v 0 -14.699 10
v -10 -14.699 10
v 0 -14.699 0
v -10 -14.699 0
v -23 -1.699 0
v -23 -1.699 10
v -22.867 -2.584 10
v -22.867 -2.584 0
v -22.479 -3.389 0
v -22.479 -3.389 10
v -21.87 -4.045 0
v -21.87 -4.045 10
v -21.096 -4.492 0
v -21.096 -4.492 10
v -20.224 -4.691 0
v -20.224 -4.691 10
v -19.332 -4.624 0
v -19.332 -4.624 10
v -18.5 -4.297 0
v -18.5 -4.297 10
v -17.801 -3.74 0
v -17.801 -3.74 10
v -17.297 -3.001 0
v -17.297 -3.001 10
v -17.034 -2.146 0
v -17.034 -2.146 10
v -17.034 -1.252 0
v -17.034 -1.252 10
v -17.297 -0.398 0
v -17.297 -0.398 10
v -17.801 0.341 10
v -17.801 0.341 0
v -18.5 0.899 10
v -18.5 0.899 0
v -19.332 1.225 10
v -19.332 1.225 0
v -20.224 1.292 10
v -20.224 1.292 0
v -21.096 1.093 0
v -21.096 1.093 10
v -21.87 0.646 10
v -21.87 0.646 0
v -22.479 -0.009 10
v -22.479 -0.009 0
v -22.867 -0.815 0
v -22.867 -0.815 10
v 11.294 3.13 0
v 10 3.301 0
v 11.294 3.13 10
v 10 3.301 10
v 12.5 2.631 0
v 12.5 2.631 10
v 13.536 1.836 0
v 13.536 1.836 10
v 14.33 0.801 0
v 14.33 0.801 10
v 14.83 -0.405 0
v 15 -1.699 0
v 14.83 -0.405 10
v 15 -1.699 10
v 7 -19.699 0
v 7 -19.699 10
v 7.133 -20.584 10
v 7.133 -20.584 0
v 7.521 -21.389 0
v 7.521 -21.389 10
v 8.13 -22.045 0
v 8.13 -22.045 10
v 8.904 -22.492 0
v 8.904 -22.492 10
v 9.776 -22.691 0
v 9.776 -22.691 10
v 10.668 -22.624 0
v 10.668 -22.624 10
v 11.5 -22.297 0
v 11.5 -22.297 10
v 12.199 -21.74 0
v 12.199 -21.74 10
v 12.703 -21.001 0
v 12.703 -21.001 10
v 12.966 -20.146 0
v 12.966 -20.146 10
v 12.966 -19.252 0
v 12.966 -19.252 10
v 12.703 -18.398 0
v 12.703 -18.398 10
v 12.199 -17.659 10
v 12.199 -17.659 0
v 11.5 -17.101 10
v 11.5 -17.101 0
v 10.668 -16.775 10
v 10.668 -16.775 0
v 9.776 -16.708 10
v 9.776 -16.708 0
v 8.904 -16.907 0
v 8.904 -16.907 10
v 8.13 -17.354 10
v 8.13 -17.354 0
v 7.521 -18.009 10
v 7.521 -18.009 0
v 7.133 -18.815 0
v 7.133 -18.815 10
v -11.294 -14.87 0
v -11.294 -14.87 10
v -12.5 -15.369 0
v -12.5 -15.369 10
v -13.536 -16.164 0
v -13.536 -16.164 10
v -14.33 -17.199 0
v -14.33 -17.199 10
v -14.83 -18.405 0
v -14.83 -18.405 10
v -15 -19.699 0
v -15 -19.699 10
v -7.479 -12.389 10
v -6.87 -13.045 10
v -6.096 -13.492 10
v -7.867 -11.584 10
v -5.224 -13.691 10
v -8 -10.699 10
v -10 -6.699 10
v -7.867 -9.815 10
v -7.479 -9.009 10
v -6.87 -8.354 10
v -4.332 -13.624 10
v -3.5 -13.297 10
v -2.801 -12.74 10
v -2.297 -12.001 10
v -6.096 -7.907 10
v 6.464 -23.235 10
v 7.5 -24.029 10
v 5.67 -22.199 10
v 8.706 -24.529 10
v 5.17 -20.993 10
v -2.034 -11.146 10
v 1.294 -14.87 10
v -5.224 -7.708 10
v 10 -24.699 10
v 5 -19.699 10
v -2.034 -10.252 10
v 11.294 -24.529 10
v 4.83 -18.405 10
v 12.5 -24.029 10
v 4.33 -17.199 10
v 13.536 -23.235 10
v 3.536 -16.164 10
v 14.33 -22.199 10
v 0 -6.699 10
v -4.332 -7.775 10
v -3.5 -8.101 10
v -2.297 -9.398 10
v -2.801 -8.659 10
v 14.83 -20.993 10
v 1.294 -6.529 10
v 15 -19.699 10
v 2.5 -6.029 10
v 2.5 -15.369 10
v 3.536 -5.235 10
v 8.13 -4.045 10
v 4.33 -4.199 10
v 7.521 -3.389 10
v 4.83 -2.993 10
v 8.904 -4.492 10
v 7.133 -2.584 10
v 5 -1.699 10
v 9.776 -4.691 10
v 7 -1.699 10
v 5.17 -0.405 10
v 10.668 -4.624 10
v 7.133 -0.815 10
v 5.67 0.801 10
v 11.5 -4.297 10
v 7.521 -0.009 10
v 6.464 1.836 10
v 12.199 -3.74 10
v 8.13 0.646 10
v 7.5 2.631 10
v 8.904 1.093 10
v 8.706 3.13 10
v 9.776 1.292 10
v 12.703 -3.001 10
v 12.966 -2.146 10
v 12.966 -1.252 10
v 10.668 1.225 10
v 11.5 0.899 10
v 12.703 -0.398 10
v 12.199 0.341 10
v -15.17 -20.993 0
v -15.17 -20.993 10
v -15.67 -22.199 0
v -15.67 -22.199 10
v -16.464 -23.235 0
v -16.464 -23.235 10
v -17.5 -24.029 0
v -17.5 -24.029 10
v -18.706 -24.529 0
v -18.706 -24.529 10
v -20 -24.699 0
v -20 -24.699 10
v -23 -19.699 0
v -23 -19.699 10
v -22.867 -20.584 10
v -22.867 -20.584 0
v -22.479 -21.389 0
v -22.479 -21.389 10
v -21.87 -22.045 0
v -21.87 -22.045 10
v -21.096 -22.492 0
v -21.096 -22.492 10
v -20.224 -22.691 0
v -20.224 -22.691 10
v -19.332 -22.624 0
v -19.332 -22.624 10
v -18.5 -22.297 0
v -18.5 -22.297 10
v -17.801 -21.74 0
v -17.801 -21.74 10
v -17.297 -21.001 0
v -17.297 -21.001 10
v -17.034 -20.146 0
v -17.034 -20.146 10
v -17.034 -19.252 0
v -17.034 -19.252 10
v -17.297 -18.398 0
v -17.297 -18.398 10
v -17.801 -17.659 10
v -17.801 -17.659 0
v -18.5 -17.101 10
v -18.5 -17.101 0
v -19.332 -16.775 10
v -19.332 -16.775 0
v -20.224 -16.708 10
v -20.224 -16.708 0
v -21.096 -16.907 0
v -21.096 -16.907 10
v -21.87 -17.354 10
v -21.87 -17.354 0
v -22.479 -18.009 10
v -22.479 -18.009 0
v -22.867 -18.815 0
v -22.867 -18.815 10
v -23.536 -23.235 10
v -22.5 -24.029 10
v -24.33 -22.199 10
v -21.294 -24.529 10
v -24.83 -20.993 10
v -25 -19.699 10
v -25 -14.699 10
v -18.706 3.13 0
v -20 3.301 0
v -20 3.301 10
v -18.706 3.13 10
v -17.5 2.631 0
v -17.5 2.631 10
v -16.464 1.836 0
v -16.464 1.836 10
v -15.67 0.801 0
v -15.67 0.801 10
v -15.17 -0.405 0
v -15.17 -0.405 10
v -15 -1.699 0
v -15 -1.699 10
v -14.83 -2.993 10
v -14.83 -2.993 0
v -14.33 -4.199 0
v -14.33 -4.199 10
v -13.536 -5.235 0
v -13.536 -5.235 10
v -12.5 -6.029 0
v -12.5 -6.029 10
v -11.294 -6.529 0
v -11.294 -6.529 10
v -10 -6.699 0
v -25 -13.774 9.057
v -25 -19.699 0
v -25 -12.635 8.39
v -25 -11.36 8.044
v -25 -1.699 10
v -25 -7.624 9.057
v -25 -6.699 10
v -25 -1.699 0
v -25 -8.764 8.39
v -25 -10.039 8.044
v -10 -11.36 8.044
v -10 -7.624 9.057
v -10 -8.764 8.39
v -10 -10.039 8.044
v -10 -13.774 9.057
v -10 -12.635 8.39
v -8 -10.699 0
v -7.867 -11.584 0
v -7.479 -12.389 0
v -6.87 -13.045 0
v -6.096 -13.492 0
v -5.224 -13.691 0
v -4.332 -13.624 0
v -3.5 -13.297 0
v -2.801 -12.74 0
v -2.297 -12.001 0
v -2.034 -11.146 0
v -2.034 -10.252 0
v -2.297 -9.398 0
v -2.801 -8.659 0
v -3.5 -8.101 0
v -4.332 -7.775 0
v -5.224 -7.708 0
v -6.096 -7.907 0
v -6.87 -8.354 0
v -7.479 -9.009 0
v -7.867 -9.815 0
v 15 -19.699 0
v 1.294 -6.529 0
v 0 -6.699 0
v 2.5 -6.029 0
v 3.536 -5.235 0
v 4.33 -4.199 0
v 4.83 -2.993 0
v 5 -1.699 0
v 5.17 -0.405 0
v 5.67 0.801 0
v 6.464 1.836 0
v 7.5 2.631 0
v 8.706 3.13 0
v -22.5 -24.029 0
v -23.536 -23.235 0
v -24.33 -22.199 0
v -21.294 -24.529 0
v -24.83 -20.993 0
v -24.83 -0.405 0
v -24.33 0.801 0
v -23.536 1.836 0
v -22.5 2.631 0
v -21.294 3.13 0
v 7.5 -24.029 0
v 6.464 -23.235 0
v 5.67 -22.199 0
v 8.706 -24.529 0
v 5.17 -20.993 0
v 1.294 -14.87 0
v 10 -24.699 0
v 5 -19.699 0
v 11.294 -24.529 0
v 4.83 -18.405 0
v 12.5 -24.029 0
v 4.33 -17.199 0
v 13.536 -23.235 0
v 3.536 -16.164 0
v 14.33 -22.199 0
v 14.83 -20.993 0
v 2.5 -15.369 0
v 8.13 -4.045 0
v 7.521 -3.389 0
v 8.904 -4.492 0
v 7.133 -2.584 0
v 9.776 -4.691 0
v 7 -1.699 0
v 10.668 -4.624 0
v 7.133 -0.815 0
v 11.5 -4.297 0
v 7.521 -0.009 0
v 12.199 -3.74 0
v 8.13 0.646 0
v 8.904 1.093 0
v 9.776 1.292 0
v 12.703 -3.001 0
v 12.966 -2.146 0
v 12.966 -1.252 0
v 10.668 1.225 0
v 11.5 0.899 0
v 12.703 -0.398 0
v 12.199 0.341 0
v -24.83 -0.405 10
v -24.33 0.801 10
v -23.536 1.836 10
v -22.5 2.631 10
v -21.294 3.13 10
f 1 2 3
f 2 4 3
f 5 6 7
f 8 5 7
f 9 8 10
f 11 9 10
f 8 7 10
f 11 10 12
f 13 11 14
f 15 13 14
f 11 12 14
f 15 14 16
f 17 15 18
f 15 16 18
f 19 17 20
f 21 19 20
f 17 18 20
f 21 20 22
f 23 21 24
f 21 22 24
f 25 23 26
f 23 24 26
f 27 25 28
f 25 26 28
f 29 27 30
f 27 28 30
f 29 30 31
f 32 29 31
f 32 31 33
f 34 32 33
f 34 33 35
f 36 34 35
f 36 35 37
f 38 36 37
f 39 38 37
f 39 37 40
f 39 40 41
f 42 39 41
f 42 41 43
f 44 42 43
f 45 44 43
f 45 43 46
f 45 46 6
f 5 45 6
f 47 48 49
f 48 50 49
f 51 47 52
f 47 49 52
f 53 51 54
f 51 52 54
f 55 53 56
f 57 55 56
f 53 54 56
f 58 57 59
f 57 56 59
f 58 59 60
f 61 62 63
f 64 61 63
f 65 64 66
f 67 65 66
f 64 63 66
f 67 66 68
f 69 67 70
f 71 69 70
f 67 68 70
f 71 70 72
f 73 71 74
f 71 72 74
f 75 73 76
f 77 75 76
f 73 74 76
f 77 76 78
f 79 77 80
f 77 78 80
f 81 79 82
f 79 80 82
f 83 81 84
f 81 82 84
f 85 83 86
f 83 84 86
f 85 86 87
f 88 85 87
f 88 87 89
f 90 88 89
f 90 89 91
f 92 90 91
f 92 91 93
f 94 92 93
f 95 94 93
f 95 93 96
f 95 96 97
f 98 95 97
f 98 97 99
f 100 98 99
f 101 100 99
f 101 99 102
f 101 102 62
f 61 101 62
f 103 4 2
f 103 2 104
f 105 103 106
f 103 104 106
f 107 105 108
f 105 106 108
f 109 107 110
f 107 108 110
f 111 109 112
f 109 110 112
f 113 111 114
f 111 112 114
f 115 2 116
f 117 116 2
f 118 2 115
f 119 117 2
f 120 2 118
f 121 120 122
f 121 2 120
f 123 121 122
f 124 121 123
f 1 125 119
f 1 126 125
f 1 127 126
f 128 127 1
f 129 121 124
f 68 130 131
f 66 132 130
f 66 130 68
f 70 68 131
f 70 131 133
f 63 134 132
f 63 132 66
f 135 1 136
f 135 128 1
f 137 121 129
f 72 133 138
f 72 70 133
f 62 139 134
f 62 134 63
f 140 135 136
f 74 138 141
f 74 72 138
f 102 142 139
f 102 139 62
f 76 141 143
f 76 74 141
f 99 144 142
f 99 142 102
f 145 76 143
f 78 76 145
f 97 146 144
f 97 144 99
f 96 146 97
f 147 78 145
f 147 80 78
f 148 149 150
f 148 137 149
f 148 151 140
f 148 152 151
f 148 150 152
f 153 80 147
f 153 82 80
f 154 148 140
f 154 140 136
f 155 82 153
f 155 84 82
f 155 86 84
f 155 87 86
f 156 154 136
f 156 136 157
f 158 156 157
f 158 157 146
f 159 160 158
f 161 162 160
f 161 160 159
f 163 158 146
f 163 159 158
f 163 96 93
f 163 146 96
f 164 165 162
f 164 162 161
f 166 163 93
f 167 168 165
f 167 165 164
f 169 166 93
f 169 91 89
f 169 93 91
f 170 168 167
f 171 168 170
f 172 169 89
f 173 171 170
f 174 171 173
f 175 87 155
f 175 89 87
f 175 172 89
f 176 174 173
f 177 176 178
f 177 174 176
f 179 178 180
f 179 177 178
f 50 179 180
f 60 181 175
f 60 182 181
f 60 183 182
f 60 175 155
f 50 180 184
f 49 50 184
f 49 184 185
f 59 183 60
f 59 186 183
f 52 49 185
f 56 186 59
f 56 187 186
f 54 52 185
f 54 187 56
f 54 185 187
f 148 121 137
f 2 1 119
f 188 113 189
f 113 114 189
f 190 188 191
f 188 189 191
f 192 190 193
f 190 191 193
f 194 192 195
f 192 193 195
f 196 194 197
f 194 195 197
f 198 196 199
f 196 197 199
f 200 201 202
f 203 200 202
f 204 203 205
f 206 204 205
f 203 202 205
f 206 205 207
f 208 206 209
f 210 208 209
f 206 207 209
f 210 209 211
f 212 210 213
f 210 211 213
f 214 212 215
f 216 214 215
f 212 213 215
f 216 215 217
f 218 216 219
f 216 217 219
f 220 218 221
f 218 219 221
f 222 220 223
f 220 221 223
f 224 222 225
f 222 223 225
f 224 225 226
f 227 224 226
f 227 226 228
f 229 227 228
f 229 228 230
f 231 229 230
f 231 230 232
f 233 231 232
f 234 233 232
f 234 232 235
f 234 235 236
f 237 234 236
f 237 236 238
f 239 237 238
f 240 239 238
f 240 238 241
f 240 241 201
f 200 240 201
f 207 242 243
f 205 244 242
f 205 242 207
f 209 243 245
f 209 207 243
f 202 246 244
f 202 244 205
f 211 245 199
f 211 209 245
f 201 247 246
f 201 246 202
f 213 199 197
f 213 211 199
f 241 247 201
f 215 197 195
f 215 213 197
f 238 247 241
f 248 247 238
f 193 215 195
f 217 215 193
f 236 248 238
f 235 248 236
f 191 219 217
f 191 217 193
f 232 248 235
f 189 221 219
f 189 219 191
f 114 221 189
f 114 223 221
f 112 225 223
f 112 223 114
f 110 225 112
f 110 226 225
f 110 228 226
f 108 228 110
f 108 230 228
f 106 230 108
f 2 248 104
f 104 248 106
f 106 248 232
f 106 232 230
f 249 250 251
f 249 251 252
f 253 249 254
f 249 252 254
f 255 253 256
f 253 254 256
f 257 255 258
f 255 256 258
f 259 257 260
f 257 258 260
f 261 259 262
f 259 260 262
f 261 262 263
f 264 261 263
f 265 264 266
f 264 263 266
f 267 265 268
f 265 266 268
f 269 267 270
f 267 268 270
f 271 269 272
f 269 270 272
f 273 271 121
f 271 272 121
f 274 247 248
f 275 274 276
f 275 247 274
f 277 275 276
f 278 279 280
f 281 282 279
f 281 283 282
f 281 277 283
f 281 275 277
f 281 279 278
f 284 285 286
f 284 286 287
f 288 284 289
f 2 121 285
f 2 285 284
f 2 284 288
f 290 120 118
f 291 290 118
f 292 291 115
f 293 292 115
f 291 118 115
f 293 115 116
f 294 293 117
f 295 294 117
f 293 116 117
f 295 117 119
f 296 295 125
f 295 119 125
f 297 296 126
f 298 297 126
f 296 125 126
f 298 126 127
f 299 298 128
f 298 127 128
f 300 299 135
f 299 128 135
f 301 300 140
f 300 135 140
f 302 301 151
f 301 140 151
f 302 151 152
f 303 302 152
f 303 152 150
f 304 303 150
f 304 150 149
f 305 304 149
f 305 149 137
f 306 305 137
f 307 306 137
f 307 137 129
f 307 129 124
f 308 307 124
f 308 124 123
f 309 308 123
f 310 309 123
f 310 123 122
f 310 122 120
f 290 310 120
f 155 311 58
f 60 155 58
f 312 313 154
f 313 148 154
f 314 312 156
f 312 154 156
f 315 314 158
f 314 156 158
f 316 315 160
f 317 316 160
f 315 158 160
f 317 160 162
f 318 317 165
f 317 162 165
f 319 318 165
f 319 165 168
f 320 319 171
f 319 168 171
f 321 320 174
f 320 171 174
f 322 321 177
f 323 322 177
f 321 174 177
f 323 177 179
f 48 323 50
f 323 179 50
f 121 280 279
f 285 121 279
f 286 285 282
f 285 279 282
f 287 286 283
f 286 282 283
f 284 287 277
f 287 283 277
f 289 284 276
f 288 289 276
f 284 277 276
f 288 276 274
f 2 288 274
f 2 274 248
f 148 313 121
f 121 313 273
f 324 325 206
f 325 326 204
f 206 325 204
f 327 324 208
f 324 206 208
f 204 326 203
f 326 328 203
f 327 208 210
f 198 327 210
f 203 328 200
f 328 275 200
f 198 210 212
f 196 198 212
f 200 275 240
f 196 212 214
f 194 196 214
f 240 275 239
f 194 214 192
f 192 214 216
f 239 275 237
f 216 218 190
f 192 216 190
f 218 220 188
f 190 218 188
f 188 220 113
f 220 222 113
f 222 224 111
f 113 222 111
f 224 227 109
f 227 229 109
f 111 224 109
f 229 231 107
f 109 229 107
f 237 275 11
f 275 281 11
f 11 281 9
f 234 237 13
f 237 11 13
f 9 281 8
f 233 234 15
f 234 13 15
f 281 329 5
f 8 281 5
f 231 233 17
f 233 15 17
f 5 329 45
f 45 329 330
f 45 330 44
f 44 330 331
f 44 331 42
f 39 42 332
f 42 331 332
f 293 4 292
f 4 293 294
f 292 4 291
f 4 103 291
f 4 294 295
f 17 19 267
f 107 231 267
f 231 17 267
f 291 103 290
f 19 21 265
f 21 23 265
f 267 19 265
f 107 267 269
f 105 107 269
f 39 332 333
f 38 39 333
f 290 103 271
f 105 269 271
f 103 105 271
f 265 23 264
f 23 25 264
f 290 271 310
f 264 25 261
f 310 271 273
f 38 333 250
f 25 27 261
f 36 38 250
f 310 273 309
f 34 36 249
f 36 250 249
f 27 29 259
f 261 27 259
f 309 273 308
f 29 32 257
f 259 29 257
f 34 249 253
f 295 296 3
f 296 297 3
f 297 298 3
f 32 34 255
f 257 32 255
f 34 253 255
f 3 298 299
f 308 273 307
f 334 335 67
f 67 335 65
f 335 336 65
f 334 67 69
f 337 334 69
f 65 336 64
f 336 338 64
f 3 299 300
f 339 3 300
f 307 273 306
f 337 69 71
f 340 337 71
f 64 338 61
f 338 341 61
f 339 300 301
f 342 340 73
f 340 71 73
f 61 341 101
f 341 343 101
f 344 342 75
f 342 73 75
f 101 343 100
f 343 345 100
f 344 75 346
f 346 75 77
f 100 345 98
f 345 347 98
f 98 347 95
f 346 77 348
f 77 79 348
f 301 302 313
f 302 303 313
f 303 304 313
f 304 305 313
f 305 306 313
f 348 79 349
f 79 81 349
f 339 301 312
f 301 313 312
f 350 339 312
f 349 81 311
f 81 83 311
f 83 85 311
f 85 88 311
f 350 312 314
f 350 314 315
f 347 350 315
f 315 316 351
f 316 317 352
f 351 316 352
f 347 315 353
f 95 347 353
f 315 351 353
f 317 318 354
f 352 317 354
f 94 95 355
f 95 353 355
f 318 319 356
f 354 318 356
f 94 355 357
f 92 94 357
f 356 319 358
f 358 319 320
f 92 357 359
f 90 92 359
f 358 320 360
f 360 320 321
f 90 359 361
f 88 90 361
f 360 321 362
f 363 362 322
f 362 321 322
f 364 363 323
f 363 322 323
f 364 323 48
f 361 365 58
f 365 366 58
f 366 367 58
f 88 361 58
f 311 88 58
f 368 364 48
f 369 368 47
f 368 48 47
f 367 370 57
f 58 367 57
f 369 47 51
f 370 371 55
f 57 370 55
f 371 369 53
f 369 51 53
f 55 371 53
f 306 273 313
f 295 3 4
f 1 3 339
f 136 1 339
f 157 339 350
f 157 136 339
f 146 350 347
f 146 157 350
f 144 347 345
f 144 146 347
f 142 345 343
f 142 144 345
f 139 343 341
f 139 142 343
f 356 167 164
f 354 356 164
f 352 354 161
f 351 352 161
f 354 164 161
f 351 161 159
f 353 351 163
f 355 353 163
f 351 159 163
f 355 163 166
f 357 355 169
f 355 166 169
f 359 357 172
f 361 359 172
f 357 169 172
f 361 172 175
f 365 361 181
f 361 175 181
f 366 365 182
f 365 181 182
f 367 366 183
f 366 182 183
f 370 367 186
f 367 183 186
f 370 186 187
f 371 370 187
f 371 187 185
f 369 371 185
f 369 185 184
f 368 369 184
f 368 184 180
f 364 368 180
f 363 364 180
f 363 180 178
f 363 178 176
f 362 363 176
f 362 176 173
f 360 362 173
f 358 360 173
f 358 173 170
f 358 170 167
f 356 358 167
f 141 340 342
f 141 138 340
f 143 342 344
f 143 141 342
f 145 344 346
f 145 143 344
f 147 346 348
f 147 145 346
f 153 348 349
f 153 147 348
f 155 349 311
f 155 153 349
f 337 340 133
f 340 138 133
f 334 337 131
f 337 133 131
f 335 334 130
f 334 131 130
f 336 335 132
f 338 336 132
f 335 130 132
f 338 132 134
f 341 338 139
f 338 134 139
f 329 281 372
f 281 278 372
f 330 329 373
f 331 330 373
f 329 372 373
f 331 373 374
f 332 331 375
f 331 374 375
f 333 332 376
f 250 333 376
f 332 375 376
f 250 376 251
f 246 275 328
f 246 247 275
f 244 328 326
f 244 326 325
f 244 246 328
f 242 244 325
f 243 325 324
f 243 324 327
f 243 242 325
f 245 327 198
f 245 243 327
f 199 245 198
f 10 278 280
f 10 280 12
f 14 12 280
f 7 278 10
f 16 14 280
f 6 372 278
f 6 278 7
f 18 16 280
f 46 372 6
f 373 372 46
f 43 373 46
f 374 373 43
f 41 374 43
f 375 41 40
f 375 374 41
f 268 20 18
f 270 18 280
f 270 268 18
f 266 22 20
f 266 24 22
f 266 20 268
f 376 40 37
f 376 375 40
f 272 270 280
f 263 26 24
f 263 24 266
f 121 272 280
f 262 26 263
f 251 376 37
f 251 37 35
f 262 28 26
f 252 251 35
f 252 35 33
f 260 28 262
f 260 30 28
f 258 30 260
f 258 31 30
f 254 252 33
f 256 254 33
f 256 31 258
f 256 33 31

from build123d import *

# Parameters (mm, degrees)
F1_W       = 10
F1_H       = 10
F2_DEPTH   = 10
F1_H_2     = 8
F1_W_2     = 20
F3_DEPTH   = 10
F5_DEPTH   = 15
F6_D       = 6
F6_DEPTH   = 20
F6_TIP     = 1.8025818571
F6_2_D     = 6
F6_2_DEPTH = 20
F6_2_TIP   = 1.8025818571
F6_3_D     = 6
F6_3_DEPTH = 20
F6_3_TIP   = 1.8025818571
F6_4_D     = 6
F6_4_DEPTH = 20
F6_4_TIP   = 1.8025818571
F6_5_D     = 6
F6_5_DEPTH = 20
F6_5_TIP   = 1.8025818571
F7_R       = 5
F7_2_R     = 5
F7_3_R     = 5
F7_4_R     = 5
F9_R       = 4.99999


# Not quite as in the source:
# - a fillet or chamfer is up to 0.001 mm smaller than in the source, because OpenCascade refuses the exact size


with BuildPart() as f2:
    # F1 (on Top) → F2 (new body)
    with BuildSketch(Plane.XY):
        with Locations((-20, -1.6993483007)):
            Rectangle(F1_W, F1_H)
    extrude(amount=F2_DEPTH)

    # F6
    with Locations(Plane(origin=(0, 0, 0), x_dir=(1, 0, 0), z_dir=(0, 0, -1))):
        with Locations((-20, 1.6993483007), (-5, 10.6993483007), (10, 1.6993483007), (10, 19.6993483007), (-20, 19.6993483007)):
            Hole(F6_D / 2, depth=F6_DEPTH)
            with Locations((0, 0, -(F6_DEPTH + F6_TIP / 2))):  # 118° drill point
                Cone(0, F6_D / 2, F6_TIP, mode=Mode.SUBTRACT)

    # F7
    f7_edges = [f2.edges().sort_by_distance(p)[0] for p in [
        (-25, 3.300652, 5),
    ]]
    fillet(f7_edges, radius=F7_R)


with BuildPart() as f2b:
    # F1 (on Top) → F2, piece 2 (new body)
    with BuildSketch(Plane.XY):
        with Locations((-20, -19.6993483007)):
            Rectangle(F1_W, F1_H)
    extrude(amount=F2_DEPTH)

    # F6#2
    with Locations(Plane(origin=(0, 0, 0), x_dir=(1, 0, 0), z_dir=(0, 0, -1))):
        with Locations((-20, 1.6993483007), (-5, 10.6993483007), (10, 1.6993483007), (10, 19.6993483007), (-20, 19.6993483007)):
            Hole(F6_2_D / 2, depth=F6_2_DEPTH)
            with Locations((0, 0, -(F6_2_DEPTH + F6_2_TIP / 2))):  # 118° drill point
                Cone(0, F6_2_D / 2, F6_2_TIP, mode=Mode.SUBTRACT)

    # F7#2
    f7_2_edges = [f2b.edges().sort_by_distance(p)[0] for p in [
        (-25, -24.699348, 5),
    ]]
    fillet(f7_2_edges, radius=F7_2_R)


with BuildPart() as f2c:
    # F1 (on Top) → F2, piece 3 (new body)
    with BuildSketch(Plane.XY):
        with Locations((10, -1.6993483007)):
            Rectangle(F1_W, F1_H)
    extrude(amount=F2_DEPTH)

    # F6#3
    with Locations(Plane(origin=(0, 0, 0), x_dir=(1, 0, 0), z_dir=(0, 0, -1))):
        with Locations((-20, 1.6993483007), (-5, 10.6993483007), (10, 1.6993483007), (10, 19.6993483007), (-20, 19.6993483007)):
            Hole(F6_3_D / 2, depth=F6_3_DEPTH)
            with Locations((0, 0, -(F6_3_DEPTH + F6_3_TIP / 2))):  # 118° drill point
                Cone(0, F6_3_D / 2, F6_3_TIP, mode=Mode.SUBTRACT)

    # F7#4
    f7_4_edges = [f2c.edges().sort_by_distance(p)[0] for p in [
        (15, 3.300652, 5),
    ]]
    fillet(f7_4_edges, radius=F7_4_R)


with BuildPart() as f2d:
    # F1 (on Top) → F2, piece 4 (new body)
    with BuildSketch(Plane.XY):
        with Locations((10, -19.6993483007)):
            Rectangle(F1_W, F1_H)
    extrude(amount=F2_DEPTH)

    # F6#4
    with Locations(Plane(origin=(0, 0, 0), x_dir=(1, 0, 0), z_dir=(0, 0, -1))):
        with Locations((-20, 1.6993483007), (-5, 10.6993483007), (10, 1.6993483007), (10, 19.6993483007), (-20, 19.6993483007)):
            Hole(F6_4_D / 2, depth=F6_4_DEPTH)
            with Locations((0, 0, -(F6_4_DEPTH + F6_4_TIP / 2))):  # 118° drill point
                Cone(0, F6_4_D / 2, F6_4_TIP, mode=Mode.SUBTRACT)

    # F7#3
    f7_3_edges = [f2d.edges().sort_by_distance(p)[0] for p in [
        (15, -24.699348, 5),
    ]]
    fillet(f7_3_edges, radius=F7_3_R)


with BuildPart() as f3:
    # F1 (on Top) → F3 (new body)
    with BuildSketch(Plane.XY):
        with Locations((-20, -10.6993483007)):
            Rectangle(F1_W, F1_H_2)
        with Locations((-5, -10.6993483007)):
            Rectangle(F1_W_2, F1_H_2)
        with Locations((10, -10.6993483007)):
            Rectangle(F1_W, F1_H_2)
    extrude(amount=F3_DEPTH)

    # F4 (on face) → F5 (cut)
    with BuildSketch(Plane(origin=(-25, 0, 0), x_dir=(0, -1, 0), z_dir=(-1, 0, 0))):
        with BuildLine():
            Line((14.6993483007, 10), (6.6993483007, 10))
            ThreePointArc((6.6993483007, 10), (10.6993483007, 8), (14.6993483007, 10))
        make_face()
    extrude(amount=-F5_DEPTH, mode=Mode.SUBTRACT)

    # F6#5
    with Locations(Plane(origin=(0, 0, 0), x_dir=(1, 0, 0), z_dir=(0, 0, -1))):
        with Locations((-20, 1.6993483007), (-5, 10.6993483007), (10, 1.6993483007), (10, 19.6993483007), (-20, 19.6993483007)):
            Hole(F6_5_D / 2, depth=F6_5_DEPTH)
            with Locations((0, 0, -(F6_5_DEPTH + F6_5_TIP / 2))):  # 118° drill point
                Cone(0, F6_5_D / 2, F6_5_TIP, mode=Mode.SUBTRACT)


with BuildPart() as f2_1:
    add(f2.part)

    # F8: union F2c, F3, F2b, F2d
    add(f2c.part)
    add(f3.part)
    add(f2b.part)
    add(f2d.part)

    # F9 (radius 5 in the source; OpenCascade refuses exactly that, so slightly less here)
    f9_edges = [f2_1.edges().sort_by_distance(p)[0] for p in [
        (-15, 3.300652, 5),
        (5, 3.300652, 5),
        (-15, -24.699348, 5),
        (5, -24.699348, 5),
        (-15, -14.699348, 5),
        (5, -14.699348, 5),
        (5, -6.699348, 5),
        (-15, -6.699348, 5),
    ]]
    fillet(f9_edges, radius=F9_R)


solid = f2_1.part
